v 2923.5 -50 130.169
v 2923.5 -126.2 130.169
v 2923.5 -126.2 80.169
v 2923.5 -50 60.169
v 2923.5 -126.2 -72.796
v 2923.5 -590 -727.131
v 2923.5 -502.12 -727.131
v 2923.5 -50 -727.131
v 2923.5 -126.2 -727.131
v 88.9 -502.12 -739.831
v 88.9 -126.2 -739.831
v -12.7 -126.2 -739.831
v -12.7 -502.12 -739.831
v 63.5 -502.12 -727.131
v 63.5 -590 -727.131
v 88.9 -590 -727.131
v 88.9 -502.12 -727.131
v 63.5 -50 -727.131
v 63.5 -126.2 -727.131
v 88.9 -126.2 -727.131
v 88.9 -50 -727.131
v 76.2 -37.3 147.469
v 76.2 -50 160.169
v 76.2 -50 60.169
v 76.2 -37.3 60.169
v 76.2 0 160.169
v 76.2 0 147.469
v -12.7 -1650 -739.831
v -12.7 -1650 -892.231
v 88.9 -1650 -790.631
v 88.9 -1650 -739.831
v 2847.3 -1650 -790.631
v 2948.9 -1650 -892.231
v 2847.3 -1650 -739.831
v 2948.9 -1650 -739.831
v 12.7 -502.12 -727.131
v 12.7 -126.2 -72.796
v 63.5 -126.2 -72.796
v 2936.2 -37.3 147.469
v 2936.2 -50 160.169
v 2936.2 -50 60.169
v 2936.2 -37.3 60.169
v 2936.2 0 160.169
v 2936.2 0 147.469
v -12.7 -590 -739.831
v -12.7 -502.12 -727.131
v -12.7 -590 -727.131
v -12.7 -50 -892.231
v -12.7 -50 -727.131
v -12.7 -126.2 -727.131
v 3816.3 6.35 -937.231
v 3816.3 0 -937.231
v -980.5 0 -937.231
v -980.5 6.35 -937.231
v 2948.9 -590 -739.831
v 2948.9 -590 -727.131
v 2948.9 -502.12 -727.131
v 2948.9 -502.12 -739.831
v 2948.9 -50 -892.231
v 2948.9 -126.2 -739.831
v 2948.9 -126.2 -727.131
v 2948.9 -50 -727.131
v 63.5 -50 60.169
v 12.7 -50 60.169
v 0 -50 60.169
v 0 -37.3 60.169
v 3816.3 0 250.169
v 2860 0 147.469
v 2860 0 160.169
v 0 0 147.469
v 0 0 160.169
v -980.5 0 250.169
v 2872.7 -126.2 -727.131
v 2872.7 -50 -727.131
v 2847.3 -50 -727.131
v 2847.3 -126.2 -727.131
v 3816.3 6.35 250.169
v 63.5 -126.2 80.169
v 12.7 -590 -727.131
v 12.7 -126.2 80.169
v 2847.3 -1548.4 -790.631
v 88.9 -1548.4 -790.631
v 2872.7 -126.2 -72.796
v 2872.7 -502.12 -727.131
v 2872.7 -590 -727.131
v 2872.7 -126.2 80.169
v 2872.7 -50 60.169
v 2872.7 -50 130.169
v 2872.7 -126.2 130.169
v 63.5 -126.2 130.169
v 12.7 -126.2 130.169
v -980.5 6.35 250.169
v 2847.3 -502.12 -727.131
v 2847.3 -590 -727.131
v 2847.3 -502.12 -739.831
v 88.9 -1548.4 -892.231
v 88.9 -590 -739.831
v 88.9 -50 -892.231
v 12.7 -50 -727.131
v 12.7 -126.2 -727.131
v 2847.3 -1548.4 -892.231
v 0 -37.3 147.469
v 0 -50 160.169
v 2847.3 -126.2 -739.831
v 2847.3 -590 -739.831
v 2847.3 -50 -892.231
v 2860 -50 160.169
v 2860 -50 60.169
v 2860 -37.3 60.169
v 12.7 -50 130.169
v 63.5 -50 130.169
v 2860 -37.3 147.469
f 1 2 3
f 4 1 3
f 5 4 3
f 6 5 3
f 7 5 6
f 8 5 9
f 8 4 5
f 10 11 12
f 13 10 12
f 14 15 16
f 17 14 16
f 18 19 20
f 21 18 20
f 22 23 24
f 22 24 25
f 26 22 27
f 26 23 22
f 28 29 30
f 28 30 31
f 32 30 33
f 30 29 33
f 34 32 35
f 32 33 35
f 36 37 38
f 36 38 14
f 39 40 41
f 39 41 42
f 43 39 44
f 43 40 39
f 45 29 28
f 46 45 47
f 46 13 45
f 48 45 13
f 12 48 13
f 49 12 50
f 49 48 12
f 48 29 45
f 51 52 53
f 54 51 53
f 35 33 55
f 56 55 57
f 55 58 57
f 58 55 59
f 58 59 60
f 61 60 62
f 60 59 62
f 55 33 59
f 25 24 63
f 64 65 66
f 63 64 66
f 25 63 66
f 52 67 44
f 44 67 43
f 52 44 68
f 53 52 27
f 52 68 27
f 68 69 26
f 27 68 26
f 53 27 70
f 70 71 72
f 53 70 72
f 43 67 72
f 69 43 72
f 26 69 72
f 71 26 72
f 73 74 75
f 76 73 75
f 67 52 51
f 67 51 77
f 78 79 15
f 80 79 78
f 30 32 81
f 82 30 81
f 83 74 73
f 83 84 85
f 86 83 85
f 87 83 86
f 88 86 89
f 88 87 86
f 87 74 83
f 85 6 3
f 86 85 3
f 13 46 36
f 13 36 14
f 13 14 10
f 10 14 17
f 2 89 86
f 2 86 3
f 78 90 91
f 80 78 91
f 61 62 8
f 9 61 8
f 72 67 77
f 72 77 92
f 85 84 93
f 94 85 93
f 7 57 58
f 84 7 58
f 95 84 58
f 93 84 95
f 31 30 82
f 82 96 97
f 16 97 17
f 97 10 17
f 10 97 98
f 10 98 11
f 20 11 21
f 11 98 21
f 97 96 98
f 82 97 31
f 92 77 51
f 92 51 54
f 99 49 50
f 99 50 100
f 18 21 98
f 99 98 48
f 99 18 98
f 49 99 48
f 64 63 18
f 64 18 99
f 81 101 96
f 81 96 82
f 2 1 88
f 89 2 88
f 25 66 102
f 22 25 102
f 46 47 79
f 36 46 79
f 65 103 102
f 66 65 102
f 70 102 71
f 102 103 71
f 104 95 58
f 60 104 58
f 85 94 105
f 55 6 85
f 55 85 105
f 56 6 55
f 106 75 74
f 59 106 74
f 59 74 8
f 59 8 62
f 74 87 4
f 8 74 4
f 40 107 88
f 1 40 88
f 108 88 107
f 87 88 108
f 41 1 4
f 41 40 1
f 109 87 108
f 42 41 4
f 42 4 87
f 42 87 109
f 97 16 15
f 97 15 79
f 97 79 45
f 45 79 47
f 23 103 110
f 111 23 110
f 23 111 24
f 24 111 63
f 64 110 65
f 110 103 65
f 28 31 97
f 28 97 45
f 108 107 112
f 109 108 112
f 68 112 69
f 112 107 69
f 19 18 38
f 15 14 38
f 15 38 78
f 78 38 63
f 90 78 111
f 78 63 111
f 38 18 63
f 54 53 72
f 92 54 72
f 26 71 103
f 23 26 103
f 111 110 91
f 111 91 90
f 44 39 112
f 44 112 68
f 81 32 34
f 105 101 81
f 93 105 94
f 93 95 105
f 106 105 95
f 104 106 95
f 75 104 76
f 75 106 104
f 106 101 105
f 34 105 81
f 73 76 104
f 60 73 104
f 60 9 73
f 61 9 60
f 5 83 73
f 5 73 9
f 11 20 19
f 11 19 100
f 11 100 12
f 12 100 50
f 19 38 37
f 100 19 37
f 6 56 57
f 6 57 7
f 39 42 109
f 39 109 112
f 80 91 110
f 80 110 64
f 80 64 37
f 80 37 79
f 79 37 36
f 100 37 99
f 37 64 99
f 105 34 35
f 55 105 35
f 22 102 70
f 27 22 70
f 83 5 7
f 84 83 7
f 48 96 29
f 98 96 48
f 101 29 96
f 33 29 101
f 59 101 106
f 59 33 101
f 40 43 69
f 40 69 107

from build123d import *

# Parameters (mm, degrees)
F0_W      = 37.3
F0_H      = 12.7
F1_DEPTH  = 76.2
F2_W      = 50.8
F2_H      = 787.3
F2_H_2    = 70
F3_DEPTH  = 76.2
F4_W      = 25.4
F4_H      = 76.2
F4_W_2    = 50.8
F5_DEPTH  = 12.7
F7_DEPTH  = 50.8
F8_W      = 25.4
F8_H      = 87.8800762295
F8_W_2    = 50.8
F9_DEPTH  = 12.7
F10_W     = 101.6
F10_H     = 152.4
F11_DEPTH = 1600
F12_W     = 101.6
F12_H     = 101.6
F13_DEPTH = 1379.2
F15_W     = 4796.8
F15_H     = 1187.4
F15_W_2   = 76.2
F15_H_2   = 12.7
F16_DEPTH = 6.35


with BuildPart() as f1:
    # F0 (on Right) → F1 (new body)
    with BuildSketch(Plane.YZ):
        with Locations((-18.65, 153.8194847476)):
            Rectangle(F0_W, F0_H)
        Polygon((-37.3, 147.4694847476), (-37.3, 160.1694847476), (-50, 160.1694847476), (-50, 60.1694847476), (-37.3, 60.1694847476), align=None)
    extrude(amount=F1_DEPTH)

    # F2 (on face) → F3 (join)
    with BuildSketch(Plane.XZ.offset(50)):
        with Locations((38.1, -333.4805152524)):
            Rectangle(F2_W, F2_H)
        with Locations((38.1, 95.1694847476)):
            Rectangle(F2_W, F2_H_2)
    extrude(amount=F3_DEPTH)

    # F4 (on face) → F5 (join)
    with BuildSketch(Plane(origin=(0, 0, -727.1305152524), x_dir=(1, 0, 0), z_dir=(0, 0, -1))):
        with Locations((0, 88.1)):
            Rectangle(F4_W, F4_H)
        with Locations((38.1, 88.1)):
            Rectangle(F4_W_2, F4_H)
        with Locations((76.2, 88.1)):
            Rectangle(F4_W, F4_H)
    extrude(amount=F5_DEPTH)

    # F6 (on face) → F7 (join, through all)
    with BuildSketch(Plane(origin=(12.7, 0, 0), x_dir=(0, -1, 0), z_dir=(-1, 0, 0))):
        Polygon((590, -727.1305152524), (126.2, 80.1694847476), (126.2, -72.7964176673), (502.1199237705, -727.1305152524), align=None)
    extrude(amount=-F7_DEPTH)

    # F8 (on face) → F9 (join)
    with BuildSketch(Plane(origin=(0, 0, -727.1305152524), x_dir=(1, 0, 0), z_dir=(0, 0, -1))):
        with Locations((0, 546.0599618853)):
            Rectangle(F8_W, F8_H)
        with Locations((38.1, 546.0599618853)):
            Rectangle(F8_W_2, F8_H)
        with Locations((76.2, 546.0599618853)):
            Rectangle(F8_W, F8_H)
    extrude(amount=F9_DEPTH)

    # F10 (on face) → F11 (join)
    with BuildSketch(Plane(origin=(0, -50, 0), x_dir=(-1, 0, 0), z_dir=(0, 1, 0))):
        with Locations((-38.1, -816.0305152524)):
            Rectangle(F10_W, F10_H)
    extrude(amount=-F11_DEPTH)

    # F12 (on face) → F13 (join)
    with BuildSketch(Plane.YZ.offset(88.9)):
        with Locations((-1599.2, -841.4305152524)):
            Rectangle(F12_W, F12_H)
    extrude(amount=F13_DEPTH)

    # F14: F1 across face


with BuildPart() as f1_1:
    add(f1.part)
    add(f1.part.mirror(Plane(origin=(1468.1, -1599.2, -841.4305152524), x_dir=(0, 1, 0), z_dir=(1, 0, 0))))

    # F15 (on face) → F16 (join)
    with BuildSketch(Plane(origin=(0, 0, 0), x_dir=(-1, 0, 0), z_dir=(0, 1, 0))):
        with Locations((-1417.9, -343.5305152524)):
            Rectangle(F15_W, F15_H)
        with Locations((-38.1, 153.8194847476)):
            Rectangle(F15_W_2, F15_H_2, mode=Mode.SUBTRACT)
        with Locations((-38.1, 153.8194847476)):
            Rectangle(F15_W_2, F15_H_2)
    extrude(amount=F16_DEPTH)


solid = f1_1.part
